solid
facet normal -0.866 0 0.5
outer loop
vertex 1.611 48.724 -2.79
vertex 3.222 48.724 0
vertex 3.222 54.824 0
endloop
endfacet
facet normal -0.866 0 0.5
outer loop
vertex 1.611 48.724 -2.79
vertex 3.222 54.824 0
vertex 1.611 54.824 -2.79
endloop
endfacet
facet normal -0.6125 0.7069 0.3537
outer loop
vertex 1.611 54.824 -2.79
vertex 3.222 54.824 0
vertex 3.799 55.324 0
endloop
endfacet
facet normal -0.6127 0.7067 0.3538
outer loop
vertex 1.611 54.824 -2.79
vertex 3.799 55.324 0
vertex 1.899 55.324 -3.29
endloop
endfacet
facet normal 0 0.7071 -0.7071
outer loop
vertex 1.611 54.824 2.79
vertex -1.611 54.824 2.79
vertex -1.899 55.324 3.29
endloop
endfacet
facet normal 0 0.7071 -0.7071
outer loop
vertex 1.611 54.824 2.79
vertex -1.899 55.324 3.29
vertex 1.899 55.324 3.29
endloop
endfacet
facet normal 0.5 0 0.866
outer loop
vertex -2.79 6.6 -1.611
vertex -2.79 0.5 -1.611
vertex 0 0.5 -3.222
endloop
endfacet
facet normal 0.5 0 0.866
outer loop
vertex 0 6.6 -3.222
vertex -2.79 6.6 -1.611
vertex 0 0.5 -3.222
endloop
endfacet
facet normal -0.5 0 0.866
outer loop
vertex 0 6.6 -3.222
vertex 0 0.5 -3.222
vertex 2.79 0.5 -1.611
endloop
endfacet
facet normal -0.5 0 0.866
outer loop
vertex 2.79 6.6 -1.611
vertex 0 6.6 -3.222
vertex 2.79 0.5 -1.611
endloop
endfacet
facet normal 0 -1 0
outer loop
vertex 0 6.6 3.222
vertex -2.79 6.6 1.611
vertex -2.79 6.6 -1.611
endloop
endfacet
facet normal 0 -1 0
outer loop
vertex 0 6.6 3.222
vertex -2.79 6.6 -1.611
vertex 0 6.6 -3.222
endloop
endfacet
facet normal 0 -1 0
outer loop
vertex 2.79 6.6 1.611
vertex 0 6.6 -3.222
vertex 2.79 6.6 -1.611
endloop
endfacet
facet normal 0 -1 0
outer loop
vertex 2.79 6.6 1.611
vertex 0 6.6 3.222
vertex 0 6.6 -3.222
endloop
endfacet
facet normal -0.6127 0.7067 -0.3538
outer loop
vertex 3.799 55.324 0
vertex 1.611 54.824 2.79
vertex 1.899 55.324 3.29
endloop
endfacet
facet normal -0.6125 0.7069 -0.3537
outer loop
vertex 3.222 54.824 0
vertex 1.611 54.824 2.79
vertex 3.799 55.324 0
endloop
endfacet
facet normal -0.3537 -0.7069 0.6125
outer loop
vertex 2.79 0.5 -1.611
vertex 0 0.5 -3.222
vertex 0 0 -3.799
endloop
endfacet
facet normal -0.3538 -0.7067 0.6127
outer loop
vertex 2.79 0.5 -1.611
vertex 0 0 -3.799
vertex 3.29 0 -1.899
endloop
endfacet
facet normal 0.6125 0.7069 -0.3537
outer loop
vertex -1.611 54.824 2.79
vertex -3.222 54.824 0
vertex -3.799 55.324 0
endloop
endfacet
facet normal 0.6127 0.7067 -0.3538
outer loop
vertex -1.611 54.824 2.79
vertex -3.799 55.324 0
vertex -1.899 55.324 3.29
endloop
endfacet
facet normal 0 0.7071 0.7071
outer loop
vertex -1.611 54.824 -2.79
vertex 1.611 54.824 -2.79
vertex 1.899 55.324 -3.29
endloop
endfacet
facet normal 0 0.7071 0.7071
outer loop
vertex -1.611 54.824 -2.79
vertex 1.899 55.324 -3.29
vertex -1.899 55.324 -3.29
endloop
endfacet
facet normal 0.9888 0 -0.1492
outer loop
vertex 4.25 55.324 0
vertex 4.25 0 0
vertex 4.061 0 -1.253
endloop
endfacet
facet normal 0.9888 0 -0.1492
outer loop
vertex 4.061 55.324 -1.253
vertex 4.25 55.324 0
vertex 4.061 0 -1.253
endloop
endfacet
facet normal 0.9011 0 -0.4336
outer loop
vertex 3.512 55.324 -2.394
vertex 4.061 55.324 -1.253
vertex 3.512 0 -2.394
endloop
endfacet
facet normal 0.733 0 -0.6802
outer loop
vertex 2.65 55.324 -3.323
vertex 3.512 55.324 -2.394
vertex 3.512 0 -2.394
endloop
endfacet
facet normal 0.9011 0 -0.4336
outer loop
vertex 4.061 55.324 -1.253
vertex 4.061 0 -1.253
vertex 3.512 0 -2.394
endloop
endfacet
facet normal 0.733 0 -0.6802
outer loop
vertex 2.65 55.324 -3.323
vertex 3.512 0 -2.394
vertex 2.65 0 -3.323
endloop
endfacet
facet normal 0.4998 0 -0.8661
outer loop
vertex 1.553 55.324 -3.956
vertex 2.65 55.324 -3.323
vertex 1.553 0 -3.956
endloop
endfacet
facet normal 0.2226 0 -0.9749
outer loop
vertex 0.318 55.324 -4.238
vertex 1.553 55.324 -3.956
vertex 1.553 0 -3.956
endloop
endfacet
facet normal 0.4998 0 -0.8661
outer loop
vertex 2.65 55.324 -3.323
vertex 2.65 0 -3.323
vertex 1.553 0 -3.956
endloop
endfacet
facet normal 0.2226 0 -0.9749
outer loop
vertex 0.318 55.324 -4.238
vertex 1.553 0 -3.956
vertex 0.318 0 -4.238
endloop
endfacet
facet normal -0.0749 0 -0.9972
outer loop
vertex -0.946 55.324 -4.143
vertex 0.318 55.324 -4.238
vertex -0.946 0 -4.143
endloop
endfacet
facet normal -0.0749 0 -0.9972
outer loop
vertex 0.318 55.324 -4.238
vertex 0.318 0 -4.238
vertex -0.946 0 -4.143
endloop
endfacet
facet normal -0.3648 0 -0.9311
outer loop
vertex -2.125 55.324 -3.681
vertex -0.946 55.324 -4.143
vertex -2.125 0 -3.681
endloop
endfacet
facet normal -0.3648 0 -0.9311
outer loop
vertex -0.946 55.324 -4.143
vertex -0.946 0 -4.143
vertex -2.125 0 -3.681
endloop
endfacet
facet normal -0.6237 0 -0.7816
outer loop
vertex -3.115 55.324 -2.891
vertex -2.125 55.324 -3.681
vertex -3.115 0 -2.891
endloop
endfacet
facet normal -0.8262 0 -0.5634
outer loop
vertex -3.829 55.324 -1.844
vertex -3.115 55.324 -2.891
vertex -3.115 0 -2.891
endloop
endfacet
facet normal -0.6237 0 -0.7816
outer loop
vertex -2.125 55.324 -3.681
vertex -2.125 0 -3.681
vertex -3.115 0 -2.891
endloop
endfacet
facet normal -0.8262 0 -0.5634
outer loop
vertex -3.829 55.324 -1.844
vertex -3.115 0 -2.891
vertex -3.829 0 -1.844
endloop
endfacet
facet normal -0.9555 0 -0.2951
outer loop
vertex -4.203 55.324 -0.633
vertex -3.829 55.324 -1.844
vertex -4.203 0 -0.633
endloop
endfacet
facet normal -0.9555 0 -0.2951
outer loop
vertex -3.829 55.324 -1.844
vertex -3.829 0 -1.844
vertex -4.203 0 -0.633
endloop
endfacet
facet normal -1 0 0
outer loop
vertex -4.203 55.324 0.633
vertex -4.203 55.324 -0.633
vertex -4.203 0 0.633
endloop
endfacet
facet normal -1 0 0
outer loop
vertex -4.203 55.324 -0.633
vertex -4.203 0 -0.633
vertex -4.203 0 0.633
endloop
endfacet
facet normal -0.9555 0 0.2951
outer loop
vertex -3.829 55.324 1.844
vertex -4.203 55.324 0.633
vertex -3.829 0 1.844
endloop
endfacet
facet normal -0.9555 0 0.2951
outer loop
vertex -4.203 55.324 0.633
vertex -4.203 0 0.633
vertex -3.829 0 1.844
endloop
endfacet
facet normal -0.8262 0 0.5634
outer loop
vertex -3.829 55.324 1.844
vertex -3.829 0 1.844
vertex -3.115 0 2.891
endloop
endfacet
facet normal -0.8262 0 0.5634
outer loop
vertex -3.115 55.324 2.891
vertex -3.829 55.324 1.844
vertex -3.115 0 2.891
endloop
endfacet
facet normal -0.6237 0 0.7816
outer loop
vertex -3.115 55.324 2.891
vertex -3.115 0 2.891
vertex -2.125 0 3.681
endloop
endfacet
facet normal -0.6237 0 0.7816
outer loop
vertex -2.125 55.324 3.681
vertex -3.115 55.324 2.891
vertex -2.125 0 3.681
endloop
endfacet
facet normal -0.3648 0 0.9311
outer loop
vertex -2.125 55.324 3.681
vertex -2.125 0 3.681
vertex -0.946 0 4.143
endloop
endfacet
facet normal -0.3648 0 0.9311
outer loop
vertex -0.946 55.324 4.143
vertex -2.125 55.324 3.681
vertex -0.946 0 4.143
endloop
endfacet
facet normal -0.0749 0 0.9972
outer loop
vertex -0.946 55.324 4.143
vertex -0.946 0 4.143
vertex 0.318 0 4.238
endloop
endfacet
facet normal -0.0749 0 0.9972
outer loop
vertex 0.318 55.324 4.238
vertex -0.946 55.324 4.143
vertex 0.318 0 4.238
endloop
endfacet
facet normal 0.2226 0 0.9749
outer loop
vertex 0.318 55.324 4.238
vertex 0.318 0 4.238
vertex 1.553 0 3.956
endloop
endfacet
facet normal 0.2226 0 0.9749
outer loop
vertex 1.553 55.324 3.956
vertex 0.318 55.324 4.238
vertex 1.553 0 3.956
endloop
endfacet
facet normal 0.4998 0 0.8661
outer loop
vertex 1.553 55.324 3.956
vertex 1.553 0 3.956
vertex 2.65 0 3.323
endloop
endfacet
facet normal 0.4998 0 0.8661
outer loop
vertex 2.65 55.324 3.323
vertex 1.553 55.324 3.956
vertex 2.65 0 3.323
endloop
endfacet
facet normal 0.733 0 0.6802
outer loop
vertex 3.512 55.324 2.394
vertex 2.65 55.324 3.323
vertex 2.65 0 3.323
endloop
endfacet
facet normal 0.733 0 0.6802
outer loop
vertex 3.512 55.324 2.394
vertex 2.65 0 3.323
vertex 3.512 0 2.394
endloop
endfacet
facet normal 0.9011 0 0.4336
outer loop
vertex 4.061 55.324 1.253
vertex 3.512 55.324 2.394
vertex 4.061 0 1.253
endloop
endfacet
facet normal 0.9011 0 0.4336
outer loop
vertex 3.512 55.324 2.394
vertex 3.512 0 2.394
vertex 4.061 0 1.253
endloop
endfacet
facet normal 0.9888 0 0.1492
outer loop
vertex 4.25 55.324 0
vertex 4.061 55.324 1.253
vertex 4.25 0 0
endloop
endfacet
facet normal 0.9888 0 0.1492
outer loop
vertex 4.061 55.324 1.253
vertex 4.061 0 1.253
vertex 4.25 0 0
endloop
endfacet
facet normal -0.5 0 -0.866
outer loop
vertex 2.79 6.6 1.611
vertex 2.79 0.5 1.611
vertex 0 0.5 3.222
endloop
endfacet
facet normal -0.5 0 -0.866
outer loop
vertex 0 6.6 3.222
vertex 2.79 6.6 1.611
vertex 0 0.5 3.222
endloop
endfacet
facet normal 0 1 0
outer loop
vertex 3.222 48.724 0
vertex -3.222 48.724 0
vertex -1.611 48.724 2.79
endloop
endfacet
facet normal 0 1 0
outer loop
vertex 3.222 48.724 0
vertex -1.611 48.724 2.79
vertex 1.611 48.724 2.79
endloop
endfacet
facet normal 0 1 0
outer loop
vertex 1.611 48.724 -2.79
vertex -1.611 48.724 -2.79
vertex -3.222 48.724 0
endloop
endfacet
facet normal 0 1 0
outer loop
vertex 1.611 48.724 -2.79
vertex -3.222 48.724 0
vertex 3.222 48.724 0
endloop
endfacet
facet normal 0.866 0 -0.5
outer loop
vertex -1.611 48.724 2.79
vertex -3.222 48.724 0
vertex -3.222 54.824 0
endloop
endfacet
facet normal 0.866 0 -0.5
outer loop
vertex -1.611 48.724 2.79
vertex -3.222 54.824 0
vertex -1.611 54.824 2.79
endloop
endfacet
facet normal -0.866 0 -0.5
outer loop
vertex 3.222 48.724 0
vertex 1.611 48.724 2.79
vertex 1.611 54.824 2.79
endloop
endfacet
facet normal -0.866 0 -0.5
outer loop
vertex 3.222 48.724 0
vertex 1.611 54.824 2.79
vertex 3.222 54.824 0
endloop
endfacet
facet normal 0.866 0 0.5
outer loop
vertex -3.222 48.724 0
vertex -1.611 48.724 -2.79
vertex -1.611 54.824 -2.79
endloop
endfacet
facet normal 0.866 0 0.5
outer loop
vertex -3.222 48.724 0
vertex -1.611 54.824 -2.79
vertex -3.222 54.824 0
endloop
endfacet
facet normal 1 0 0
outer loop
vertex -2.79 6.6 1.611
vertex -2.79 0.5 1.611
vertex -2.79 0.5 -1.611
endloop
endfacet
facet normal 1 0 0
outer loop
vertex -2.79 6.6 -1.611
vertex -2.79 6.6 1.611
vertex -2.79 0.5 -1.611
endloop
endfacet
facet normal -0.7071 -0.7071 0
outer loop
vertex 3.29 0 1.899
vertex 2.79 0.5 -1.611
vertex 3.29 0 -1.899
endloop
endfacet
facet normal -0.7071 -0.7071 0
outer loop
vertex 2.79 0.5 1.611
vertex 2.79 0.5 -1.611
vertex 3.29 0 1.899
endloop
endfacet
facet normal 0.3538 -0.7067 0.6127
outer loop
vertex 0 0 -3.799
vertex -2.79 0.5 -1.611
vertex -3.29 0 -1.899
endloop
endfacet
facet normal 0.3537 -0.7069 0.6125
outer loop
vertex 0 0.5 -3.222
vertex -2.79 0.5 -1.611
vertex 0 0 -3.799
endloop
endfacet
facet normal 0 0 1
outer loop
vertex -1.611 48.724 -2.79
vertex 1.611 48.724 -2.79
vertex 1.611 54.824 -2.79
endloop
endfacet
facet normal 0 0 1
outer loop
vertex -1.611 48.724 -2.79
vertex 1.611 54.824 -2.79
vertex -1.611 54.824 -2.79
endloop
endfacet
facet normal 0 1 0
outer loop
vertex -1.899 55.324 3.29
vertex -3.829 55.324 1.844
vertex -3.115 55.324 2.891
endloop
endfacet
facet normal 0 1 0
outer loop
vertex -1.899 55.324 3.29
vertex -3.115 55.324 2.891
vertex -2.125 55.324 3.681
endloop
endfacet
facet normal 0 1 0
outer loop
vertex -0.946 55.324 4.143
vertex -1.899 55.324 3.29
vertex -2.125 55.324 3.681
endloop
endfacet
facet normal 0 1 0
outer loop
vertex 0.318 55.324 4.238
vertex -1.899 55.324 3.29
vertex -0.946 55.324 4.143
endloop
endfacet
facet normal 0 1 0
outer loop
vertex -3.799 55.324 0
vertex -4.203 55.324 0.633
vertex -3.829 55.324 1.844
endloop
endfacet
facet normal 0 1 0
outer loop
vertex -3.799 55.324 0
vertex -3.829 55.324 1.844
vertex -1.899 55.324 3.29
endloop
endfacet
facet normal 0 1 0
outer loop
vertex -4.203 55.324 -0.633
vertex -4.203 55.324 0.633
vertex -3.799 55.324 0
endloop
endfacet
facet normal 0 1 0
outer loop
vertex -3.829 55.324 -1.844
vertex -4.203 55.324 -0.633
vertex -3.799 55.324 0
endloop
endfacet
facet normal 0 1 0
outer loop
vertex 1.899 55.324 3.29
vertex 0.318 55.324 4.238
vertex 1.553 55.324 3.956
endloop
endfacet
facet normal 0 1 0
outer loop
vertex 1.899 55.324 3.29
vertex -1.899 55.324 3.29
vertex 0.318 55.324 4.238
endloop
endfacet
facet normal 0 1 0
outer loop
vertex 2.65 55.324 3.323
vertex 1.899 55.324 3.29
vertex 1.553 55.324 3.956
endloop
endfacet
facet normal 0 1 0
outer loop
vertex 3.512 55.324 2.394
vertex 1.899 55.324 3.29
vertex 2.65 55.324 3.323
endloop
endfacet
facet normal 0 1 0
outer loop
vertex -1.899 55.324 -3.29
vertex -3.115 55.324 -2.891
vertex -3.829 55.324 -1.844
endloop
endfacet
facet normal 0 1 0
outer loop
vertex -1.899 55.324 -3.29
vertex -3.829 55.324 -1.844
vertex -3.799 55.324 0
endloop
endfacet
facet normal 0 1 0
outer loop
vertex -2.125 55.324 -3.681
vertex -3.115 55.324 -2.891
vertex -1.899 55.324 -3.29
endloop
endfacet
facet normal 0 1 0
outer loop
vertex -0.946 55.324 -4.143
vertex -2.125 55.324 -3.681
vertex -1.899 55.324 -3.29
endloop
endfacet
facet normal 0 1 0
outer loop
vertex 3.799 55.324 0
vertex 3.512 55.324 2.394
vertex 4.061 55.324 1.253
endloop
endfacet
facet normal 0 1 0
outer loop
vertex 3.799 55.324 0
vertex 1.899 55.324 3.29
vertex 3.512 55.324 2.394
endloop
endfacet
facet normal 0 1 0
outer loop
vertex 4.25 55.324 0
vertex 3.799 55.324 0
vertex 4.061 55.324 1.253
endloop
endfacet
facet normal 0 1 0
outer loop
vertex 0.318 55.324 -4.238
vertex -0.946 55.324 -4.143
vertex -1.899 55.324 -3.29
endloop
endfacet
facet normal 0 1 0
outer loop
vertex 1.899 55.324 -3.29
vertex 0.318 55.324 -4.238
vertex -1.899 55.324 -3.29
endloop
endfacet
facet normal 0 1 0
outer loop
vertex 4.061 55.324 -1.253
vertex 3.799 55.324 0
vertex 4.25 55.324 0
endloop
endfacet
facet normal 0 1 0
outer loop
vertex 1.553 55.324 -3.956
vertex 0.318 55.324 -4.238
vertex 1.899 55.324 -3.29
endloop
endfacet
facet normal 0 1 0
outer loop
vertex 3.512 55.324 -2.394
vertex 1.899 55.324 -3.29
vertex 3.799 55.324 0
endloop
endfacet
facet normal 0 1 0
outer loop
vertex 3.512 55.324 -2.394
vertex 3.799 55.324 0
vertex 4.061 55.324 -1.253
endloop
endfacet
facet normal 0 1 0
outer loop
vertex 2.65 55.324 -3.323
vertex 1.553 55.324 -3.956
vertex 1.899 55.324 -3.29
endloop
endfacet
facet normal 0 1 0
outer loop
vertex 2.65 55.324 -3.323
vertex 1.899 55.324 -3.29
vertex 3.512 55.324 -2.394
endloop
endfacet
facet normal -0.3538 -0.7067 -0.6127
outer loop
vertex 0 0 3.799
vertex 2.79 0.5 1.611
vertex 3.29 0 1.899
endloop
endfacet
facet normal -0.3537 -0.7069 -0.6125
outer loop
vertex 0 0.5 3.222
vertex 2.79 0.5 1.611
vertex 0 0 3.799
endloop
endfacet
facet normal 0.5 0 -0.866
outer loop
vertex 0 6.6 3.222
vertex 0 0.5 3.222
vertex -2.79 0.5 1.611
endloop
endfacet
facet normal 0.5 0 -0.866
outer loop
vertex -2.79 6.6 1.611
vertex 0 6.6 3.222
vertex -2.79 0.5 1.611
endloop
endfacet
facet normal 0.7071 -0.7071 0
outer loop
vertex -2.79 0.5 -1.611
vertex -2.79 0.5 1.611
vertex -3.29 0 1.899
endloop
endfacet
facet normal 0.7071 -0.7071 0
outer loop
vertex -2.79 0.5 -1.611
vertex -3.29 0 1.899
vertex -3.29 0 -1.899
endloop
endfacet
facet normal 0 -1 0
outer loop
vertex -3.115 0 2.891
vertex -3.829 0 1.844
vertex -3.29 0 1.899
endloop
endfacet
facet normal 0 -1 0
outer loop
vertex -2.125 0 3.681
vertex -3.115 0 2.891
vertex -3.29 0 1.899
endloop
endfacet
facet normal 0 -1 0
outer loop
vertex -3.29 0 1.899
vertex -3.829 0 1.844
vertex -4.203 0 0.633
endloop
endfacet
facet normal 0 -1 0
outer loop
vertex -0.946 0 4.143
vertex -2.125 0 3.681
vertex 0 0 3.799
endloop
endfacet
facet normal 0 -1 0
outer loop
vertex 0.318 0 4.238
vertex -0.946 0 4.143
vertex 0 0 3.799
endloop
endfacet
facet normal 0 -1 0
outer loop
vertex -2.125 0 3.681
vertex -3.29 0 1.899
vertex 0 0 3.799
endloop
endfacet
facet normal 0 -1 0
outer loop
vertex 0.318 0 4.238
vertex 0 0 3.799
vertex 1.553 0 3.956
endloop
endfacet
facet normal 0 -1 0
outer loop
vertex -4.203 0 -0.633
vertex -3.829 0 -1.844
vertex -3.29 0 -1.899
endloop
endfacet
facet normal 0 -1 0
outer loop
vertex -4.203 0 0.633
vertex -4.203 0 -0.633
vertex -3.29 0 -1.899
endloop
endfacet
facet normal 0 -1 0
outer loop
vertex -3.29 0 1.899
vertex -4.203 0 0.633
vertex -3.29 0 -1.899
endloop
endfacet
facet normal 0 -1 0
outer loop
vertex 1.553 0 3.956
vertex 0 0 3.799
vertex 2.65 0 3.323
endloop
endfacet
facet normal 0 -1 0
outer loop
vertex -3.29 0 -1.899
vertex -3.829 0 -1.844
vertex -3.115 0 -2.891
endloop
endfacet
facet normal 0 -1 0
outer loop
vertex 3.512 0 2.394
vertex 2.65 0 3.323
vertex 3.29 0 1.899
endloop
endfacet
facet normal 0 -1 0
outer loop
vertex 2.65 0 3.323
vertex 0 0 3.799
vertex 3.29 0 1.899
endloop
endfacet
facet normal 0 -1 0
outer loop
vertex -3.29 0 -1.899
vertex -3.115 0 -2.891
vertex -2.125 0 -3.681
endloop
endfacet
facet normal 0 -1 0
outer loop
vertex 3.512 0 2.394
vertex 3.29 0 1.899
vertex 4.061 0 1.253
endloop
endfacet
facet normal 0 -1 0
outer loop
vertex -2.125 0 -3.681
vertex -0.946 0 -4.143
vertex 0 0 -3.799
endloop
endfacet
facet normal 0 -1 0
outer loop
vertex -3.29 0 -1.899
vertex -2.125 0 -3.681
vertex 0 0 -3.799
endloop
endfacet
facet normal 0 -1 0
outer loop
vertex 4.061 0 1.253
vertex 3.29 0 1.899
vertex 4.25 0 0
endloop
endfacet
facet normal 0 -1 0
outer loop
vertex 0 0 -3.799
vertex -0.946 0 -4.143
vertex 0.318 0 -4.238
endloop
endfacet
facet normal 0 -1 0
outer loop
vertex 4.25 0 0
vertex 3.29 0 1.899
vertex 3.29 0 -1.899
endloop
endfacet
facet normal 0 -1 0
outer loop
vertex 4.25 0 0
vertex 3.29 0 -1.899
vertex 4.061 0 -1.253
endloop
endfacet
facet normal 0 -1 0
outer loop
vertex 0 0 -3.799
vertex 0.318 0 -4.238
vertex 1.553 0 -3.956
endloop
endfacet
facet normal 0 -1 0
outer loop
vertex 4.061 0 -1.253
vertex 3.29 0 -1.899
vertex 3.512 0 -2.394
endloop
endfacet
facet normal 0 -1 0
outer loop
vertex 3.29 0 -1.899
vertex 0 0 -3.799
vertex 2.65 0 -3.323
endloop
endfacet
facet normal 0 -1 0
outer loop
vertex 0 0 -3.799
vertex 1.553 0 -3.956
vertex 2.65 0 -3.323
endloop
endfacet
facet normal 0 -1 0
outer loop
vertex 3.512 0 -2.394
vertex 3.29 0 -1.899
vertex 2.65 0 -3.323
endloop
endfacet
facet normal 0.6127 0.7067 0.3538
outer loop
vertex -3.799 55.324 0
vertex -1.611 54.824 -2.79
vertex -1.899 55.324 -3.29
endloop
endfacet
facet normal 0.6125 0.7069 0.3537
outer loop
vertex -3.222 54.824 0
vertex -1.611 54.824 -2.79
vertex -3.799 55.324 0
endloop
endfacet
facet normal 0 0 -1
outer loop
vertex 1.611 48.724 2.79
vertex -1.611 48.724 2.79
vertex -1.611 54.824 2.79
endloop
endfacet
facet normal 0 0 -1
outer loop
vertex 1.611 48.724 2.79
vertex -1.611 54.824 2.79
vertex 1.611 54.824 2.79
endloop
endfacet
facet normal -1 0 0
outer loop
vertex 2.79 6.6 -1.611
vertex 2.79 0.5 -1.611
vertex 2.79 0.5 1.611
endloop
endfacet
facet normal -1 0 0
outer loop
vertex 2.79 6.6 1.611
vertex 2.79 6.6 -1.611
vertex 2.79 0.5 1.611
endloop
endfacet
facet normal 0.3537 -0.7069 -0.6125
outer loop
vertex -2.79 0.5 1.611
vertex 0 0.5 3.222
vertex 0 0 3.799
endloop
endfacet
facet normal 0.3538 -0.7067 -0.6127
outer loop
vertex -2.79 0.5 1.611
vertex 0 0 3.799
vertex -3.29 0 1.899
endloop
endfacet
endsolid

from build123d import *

# Parameters (mm, degrees)
SKETCH1_R           = 4.25
BOSS_EXTRUDE1_DEPTH = 55.3238373
CUT_EXTRUDE1_DEPTH  = 6.6
CHAMFER1_SIZE       = 0.5
CUT_EXTRUDE2_DEPTH  = 6.6
CHAMFER2_SIZE       = 0.5


with BuildPart() as part:
    # Sketch1 → Boss-Extrude1 (new body)
    with BuildSketch(Plane(origin=(0, 0, 0), x_dir=(1, 0, 0), z_dir=(0, 1, 0))):
        Circle(SKETCH1_R)
    extrude(amount=BOSS_EXTRUDE1_DEPTH)

    # Sketch2 → Cut-Extrude1 (cut)
    with BuildSketch(Plane(origin=(0, 55.3238373, 0), x_dir=(1, 0, 0), z_dir=(0, 1, 0))):
        Polygon((1.610807251, 2.79), (-1.610807251, 2.79), (-3.221614502, 0), (-1.610807251, -2.79), (1.610807251, -2.79), (3.221614502, 0), align=None)
    extrude(amount=-CUT_EXTRUDE1_DEPTH, mode=Mode.SUBTRACT)

    # Chamfer1
    chamfer1_edges = [part.edges().sort_by_distance(p)[0] for p in [
        (2.416210877, 55.3238373, -1.395),
        (0, 55.3238373, -2.79),
        (-2.416210877, 55.3238373, -1.395),
        (-2.416210877, 55.3238373, 1.395),
        (0, 55.3238373, 2.79),
        (2.416210877, 55.3238373, 1.395),
    ]]
    chamfer(chamfer1_edges, length=CHAMFER1_SIZE)

    # Sketch3 → Cut-Extrude2 (cut)
    with BuildSketch(Plane.XZ):
        Polygon((0, 3.221614502), (-2.79, 1.610807251), (-2.79, -1.610807251), (0, -3.221614502), (2.79, -1.610807251), (2.79, 1.610807251), align=None)
    extrude(amount=-CUT_EXTRUDE2_DEPTH, mode=Mode.SUBTRACT)

    # Chamfer2
    chamfer2_edges = [part.edges().sort_by_distance(p)[0] for p in [
        (1.395, 0, 2.416210877),
        (-1.395, 0, 2.416210877),
        (-2.79, 0, 0),
        (-1.395, 0, -2.416210877),
        (1.395, 0, -2.416210877),
        (2.79, 0, 0),
    ]]
    chamfer(chamfer2_edges, length=CHAMFER2_SIZE)


solid = part.part
